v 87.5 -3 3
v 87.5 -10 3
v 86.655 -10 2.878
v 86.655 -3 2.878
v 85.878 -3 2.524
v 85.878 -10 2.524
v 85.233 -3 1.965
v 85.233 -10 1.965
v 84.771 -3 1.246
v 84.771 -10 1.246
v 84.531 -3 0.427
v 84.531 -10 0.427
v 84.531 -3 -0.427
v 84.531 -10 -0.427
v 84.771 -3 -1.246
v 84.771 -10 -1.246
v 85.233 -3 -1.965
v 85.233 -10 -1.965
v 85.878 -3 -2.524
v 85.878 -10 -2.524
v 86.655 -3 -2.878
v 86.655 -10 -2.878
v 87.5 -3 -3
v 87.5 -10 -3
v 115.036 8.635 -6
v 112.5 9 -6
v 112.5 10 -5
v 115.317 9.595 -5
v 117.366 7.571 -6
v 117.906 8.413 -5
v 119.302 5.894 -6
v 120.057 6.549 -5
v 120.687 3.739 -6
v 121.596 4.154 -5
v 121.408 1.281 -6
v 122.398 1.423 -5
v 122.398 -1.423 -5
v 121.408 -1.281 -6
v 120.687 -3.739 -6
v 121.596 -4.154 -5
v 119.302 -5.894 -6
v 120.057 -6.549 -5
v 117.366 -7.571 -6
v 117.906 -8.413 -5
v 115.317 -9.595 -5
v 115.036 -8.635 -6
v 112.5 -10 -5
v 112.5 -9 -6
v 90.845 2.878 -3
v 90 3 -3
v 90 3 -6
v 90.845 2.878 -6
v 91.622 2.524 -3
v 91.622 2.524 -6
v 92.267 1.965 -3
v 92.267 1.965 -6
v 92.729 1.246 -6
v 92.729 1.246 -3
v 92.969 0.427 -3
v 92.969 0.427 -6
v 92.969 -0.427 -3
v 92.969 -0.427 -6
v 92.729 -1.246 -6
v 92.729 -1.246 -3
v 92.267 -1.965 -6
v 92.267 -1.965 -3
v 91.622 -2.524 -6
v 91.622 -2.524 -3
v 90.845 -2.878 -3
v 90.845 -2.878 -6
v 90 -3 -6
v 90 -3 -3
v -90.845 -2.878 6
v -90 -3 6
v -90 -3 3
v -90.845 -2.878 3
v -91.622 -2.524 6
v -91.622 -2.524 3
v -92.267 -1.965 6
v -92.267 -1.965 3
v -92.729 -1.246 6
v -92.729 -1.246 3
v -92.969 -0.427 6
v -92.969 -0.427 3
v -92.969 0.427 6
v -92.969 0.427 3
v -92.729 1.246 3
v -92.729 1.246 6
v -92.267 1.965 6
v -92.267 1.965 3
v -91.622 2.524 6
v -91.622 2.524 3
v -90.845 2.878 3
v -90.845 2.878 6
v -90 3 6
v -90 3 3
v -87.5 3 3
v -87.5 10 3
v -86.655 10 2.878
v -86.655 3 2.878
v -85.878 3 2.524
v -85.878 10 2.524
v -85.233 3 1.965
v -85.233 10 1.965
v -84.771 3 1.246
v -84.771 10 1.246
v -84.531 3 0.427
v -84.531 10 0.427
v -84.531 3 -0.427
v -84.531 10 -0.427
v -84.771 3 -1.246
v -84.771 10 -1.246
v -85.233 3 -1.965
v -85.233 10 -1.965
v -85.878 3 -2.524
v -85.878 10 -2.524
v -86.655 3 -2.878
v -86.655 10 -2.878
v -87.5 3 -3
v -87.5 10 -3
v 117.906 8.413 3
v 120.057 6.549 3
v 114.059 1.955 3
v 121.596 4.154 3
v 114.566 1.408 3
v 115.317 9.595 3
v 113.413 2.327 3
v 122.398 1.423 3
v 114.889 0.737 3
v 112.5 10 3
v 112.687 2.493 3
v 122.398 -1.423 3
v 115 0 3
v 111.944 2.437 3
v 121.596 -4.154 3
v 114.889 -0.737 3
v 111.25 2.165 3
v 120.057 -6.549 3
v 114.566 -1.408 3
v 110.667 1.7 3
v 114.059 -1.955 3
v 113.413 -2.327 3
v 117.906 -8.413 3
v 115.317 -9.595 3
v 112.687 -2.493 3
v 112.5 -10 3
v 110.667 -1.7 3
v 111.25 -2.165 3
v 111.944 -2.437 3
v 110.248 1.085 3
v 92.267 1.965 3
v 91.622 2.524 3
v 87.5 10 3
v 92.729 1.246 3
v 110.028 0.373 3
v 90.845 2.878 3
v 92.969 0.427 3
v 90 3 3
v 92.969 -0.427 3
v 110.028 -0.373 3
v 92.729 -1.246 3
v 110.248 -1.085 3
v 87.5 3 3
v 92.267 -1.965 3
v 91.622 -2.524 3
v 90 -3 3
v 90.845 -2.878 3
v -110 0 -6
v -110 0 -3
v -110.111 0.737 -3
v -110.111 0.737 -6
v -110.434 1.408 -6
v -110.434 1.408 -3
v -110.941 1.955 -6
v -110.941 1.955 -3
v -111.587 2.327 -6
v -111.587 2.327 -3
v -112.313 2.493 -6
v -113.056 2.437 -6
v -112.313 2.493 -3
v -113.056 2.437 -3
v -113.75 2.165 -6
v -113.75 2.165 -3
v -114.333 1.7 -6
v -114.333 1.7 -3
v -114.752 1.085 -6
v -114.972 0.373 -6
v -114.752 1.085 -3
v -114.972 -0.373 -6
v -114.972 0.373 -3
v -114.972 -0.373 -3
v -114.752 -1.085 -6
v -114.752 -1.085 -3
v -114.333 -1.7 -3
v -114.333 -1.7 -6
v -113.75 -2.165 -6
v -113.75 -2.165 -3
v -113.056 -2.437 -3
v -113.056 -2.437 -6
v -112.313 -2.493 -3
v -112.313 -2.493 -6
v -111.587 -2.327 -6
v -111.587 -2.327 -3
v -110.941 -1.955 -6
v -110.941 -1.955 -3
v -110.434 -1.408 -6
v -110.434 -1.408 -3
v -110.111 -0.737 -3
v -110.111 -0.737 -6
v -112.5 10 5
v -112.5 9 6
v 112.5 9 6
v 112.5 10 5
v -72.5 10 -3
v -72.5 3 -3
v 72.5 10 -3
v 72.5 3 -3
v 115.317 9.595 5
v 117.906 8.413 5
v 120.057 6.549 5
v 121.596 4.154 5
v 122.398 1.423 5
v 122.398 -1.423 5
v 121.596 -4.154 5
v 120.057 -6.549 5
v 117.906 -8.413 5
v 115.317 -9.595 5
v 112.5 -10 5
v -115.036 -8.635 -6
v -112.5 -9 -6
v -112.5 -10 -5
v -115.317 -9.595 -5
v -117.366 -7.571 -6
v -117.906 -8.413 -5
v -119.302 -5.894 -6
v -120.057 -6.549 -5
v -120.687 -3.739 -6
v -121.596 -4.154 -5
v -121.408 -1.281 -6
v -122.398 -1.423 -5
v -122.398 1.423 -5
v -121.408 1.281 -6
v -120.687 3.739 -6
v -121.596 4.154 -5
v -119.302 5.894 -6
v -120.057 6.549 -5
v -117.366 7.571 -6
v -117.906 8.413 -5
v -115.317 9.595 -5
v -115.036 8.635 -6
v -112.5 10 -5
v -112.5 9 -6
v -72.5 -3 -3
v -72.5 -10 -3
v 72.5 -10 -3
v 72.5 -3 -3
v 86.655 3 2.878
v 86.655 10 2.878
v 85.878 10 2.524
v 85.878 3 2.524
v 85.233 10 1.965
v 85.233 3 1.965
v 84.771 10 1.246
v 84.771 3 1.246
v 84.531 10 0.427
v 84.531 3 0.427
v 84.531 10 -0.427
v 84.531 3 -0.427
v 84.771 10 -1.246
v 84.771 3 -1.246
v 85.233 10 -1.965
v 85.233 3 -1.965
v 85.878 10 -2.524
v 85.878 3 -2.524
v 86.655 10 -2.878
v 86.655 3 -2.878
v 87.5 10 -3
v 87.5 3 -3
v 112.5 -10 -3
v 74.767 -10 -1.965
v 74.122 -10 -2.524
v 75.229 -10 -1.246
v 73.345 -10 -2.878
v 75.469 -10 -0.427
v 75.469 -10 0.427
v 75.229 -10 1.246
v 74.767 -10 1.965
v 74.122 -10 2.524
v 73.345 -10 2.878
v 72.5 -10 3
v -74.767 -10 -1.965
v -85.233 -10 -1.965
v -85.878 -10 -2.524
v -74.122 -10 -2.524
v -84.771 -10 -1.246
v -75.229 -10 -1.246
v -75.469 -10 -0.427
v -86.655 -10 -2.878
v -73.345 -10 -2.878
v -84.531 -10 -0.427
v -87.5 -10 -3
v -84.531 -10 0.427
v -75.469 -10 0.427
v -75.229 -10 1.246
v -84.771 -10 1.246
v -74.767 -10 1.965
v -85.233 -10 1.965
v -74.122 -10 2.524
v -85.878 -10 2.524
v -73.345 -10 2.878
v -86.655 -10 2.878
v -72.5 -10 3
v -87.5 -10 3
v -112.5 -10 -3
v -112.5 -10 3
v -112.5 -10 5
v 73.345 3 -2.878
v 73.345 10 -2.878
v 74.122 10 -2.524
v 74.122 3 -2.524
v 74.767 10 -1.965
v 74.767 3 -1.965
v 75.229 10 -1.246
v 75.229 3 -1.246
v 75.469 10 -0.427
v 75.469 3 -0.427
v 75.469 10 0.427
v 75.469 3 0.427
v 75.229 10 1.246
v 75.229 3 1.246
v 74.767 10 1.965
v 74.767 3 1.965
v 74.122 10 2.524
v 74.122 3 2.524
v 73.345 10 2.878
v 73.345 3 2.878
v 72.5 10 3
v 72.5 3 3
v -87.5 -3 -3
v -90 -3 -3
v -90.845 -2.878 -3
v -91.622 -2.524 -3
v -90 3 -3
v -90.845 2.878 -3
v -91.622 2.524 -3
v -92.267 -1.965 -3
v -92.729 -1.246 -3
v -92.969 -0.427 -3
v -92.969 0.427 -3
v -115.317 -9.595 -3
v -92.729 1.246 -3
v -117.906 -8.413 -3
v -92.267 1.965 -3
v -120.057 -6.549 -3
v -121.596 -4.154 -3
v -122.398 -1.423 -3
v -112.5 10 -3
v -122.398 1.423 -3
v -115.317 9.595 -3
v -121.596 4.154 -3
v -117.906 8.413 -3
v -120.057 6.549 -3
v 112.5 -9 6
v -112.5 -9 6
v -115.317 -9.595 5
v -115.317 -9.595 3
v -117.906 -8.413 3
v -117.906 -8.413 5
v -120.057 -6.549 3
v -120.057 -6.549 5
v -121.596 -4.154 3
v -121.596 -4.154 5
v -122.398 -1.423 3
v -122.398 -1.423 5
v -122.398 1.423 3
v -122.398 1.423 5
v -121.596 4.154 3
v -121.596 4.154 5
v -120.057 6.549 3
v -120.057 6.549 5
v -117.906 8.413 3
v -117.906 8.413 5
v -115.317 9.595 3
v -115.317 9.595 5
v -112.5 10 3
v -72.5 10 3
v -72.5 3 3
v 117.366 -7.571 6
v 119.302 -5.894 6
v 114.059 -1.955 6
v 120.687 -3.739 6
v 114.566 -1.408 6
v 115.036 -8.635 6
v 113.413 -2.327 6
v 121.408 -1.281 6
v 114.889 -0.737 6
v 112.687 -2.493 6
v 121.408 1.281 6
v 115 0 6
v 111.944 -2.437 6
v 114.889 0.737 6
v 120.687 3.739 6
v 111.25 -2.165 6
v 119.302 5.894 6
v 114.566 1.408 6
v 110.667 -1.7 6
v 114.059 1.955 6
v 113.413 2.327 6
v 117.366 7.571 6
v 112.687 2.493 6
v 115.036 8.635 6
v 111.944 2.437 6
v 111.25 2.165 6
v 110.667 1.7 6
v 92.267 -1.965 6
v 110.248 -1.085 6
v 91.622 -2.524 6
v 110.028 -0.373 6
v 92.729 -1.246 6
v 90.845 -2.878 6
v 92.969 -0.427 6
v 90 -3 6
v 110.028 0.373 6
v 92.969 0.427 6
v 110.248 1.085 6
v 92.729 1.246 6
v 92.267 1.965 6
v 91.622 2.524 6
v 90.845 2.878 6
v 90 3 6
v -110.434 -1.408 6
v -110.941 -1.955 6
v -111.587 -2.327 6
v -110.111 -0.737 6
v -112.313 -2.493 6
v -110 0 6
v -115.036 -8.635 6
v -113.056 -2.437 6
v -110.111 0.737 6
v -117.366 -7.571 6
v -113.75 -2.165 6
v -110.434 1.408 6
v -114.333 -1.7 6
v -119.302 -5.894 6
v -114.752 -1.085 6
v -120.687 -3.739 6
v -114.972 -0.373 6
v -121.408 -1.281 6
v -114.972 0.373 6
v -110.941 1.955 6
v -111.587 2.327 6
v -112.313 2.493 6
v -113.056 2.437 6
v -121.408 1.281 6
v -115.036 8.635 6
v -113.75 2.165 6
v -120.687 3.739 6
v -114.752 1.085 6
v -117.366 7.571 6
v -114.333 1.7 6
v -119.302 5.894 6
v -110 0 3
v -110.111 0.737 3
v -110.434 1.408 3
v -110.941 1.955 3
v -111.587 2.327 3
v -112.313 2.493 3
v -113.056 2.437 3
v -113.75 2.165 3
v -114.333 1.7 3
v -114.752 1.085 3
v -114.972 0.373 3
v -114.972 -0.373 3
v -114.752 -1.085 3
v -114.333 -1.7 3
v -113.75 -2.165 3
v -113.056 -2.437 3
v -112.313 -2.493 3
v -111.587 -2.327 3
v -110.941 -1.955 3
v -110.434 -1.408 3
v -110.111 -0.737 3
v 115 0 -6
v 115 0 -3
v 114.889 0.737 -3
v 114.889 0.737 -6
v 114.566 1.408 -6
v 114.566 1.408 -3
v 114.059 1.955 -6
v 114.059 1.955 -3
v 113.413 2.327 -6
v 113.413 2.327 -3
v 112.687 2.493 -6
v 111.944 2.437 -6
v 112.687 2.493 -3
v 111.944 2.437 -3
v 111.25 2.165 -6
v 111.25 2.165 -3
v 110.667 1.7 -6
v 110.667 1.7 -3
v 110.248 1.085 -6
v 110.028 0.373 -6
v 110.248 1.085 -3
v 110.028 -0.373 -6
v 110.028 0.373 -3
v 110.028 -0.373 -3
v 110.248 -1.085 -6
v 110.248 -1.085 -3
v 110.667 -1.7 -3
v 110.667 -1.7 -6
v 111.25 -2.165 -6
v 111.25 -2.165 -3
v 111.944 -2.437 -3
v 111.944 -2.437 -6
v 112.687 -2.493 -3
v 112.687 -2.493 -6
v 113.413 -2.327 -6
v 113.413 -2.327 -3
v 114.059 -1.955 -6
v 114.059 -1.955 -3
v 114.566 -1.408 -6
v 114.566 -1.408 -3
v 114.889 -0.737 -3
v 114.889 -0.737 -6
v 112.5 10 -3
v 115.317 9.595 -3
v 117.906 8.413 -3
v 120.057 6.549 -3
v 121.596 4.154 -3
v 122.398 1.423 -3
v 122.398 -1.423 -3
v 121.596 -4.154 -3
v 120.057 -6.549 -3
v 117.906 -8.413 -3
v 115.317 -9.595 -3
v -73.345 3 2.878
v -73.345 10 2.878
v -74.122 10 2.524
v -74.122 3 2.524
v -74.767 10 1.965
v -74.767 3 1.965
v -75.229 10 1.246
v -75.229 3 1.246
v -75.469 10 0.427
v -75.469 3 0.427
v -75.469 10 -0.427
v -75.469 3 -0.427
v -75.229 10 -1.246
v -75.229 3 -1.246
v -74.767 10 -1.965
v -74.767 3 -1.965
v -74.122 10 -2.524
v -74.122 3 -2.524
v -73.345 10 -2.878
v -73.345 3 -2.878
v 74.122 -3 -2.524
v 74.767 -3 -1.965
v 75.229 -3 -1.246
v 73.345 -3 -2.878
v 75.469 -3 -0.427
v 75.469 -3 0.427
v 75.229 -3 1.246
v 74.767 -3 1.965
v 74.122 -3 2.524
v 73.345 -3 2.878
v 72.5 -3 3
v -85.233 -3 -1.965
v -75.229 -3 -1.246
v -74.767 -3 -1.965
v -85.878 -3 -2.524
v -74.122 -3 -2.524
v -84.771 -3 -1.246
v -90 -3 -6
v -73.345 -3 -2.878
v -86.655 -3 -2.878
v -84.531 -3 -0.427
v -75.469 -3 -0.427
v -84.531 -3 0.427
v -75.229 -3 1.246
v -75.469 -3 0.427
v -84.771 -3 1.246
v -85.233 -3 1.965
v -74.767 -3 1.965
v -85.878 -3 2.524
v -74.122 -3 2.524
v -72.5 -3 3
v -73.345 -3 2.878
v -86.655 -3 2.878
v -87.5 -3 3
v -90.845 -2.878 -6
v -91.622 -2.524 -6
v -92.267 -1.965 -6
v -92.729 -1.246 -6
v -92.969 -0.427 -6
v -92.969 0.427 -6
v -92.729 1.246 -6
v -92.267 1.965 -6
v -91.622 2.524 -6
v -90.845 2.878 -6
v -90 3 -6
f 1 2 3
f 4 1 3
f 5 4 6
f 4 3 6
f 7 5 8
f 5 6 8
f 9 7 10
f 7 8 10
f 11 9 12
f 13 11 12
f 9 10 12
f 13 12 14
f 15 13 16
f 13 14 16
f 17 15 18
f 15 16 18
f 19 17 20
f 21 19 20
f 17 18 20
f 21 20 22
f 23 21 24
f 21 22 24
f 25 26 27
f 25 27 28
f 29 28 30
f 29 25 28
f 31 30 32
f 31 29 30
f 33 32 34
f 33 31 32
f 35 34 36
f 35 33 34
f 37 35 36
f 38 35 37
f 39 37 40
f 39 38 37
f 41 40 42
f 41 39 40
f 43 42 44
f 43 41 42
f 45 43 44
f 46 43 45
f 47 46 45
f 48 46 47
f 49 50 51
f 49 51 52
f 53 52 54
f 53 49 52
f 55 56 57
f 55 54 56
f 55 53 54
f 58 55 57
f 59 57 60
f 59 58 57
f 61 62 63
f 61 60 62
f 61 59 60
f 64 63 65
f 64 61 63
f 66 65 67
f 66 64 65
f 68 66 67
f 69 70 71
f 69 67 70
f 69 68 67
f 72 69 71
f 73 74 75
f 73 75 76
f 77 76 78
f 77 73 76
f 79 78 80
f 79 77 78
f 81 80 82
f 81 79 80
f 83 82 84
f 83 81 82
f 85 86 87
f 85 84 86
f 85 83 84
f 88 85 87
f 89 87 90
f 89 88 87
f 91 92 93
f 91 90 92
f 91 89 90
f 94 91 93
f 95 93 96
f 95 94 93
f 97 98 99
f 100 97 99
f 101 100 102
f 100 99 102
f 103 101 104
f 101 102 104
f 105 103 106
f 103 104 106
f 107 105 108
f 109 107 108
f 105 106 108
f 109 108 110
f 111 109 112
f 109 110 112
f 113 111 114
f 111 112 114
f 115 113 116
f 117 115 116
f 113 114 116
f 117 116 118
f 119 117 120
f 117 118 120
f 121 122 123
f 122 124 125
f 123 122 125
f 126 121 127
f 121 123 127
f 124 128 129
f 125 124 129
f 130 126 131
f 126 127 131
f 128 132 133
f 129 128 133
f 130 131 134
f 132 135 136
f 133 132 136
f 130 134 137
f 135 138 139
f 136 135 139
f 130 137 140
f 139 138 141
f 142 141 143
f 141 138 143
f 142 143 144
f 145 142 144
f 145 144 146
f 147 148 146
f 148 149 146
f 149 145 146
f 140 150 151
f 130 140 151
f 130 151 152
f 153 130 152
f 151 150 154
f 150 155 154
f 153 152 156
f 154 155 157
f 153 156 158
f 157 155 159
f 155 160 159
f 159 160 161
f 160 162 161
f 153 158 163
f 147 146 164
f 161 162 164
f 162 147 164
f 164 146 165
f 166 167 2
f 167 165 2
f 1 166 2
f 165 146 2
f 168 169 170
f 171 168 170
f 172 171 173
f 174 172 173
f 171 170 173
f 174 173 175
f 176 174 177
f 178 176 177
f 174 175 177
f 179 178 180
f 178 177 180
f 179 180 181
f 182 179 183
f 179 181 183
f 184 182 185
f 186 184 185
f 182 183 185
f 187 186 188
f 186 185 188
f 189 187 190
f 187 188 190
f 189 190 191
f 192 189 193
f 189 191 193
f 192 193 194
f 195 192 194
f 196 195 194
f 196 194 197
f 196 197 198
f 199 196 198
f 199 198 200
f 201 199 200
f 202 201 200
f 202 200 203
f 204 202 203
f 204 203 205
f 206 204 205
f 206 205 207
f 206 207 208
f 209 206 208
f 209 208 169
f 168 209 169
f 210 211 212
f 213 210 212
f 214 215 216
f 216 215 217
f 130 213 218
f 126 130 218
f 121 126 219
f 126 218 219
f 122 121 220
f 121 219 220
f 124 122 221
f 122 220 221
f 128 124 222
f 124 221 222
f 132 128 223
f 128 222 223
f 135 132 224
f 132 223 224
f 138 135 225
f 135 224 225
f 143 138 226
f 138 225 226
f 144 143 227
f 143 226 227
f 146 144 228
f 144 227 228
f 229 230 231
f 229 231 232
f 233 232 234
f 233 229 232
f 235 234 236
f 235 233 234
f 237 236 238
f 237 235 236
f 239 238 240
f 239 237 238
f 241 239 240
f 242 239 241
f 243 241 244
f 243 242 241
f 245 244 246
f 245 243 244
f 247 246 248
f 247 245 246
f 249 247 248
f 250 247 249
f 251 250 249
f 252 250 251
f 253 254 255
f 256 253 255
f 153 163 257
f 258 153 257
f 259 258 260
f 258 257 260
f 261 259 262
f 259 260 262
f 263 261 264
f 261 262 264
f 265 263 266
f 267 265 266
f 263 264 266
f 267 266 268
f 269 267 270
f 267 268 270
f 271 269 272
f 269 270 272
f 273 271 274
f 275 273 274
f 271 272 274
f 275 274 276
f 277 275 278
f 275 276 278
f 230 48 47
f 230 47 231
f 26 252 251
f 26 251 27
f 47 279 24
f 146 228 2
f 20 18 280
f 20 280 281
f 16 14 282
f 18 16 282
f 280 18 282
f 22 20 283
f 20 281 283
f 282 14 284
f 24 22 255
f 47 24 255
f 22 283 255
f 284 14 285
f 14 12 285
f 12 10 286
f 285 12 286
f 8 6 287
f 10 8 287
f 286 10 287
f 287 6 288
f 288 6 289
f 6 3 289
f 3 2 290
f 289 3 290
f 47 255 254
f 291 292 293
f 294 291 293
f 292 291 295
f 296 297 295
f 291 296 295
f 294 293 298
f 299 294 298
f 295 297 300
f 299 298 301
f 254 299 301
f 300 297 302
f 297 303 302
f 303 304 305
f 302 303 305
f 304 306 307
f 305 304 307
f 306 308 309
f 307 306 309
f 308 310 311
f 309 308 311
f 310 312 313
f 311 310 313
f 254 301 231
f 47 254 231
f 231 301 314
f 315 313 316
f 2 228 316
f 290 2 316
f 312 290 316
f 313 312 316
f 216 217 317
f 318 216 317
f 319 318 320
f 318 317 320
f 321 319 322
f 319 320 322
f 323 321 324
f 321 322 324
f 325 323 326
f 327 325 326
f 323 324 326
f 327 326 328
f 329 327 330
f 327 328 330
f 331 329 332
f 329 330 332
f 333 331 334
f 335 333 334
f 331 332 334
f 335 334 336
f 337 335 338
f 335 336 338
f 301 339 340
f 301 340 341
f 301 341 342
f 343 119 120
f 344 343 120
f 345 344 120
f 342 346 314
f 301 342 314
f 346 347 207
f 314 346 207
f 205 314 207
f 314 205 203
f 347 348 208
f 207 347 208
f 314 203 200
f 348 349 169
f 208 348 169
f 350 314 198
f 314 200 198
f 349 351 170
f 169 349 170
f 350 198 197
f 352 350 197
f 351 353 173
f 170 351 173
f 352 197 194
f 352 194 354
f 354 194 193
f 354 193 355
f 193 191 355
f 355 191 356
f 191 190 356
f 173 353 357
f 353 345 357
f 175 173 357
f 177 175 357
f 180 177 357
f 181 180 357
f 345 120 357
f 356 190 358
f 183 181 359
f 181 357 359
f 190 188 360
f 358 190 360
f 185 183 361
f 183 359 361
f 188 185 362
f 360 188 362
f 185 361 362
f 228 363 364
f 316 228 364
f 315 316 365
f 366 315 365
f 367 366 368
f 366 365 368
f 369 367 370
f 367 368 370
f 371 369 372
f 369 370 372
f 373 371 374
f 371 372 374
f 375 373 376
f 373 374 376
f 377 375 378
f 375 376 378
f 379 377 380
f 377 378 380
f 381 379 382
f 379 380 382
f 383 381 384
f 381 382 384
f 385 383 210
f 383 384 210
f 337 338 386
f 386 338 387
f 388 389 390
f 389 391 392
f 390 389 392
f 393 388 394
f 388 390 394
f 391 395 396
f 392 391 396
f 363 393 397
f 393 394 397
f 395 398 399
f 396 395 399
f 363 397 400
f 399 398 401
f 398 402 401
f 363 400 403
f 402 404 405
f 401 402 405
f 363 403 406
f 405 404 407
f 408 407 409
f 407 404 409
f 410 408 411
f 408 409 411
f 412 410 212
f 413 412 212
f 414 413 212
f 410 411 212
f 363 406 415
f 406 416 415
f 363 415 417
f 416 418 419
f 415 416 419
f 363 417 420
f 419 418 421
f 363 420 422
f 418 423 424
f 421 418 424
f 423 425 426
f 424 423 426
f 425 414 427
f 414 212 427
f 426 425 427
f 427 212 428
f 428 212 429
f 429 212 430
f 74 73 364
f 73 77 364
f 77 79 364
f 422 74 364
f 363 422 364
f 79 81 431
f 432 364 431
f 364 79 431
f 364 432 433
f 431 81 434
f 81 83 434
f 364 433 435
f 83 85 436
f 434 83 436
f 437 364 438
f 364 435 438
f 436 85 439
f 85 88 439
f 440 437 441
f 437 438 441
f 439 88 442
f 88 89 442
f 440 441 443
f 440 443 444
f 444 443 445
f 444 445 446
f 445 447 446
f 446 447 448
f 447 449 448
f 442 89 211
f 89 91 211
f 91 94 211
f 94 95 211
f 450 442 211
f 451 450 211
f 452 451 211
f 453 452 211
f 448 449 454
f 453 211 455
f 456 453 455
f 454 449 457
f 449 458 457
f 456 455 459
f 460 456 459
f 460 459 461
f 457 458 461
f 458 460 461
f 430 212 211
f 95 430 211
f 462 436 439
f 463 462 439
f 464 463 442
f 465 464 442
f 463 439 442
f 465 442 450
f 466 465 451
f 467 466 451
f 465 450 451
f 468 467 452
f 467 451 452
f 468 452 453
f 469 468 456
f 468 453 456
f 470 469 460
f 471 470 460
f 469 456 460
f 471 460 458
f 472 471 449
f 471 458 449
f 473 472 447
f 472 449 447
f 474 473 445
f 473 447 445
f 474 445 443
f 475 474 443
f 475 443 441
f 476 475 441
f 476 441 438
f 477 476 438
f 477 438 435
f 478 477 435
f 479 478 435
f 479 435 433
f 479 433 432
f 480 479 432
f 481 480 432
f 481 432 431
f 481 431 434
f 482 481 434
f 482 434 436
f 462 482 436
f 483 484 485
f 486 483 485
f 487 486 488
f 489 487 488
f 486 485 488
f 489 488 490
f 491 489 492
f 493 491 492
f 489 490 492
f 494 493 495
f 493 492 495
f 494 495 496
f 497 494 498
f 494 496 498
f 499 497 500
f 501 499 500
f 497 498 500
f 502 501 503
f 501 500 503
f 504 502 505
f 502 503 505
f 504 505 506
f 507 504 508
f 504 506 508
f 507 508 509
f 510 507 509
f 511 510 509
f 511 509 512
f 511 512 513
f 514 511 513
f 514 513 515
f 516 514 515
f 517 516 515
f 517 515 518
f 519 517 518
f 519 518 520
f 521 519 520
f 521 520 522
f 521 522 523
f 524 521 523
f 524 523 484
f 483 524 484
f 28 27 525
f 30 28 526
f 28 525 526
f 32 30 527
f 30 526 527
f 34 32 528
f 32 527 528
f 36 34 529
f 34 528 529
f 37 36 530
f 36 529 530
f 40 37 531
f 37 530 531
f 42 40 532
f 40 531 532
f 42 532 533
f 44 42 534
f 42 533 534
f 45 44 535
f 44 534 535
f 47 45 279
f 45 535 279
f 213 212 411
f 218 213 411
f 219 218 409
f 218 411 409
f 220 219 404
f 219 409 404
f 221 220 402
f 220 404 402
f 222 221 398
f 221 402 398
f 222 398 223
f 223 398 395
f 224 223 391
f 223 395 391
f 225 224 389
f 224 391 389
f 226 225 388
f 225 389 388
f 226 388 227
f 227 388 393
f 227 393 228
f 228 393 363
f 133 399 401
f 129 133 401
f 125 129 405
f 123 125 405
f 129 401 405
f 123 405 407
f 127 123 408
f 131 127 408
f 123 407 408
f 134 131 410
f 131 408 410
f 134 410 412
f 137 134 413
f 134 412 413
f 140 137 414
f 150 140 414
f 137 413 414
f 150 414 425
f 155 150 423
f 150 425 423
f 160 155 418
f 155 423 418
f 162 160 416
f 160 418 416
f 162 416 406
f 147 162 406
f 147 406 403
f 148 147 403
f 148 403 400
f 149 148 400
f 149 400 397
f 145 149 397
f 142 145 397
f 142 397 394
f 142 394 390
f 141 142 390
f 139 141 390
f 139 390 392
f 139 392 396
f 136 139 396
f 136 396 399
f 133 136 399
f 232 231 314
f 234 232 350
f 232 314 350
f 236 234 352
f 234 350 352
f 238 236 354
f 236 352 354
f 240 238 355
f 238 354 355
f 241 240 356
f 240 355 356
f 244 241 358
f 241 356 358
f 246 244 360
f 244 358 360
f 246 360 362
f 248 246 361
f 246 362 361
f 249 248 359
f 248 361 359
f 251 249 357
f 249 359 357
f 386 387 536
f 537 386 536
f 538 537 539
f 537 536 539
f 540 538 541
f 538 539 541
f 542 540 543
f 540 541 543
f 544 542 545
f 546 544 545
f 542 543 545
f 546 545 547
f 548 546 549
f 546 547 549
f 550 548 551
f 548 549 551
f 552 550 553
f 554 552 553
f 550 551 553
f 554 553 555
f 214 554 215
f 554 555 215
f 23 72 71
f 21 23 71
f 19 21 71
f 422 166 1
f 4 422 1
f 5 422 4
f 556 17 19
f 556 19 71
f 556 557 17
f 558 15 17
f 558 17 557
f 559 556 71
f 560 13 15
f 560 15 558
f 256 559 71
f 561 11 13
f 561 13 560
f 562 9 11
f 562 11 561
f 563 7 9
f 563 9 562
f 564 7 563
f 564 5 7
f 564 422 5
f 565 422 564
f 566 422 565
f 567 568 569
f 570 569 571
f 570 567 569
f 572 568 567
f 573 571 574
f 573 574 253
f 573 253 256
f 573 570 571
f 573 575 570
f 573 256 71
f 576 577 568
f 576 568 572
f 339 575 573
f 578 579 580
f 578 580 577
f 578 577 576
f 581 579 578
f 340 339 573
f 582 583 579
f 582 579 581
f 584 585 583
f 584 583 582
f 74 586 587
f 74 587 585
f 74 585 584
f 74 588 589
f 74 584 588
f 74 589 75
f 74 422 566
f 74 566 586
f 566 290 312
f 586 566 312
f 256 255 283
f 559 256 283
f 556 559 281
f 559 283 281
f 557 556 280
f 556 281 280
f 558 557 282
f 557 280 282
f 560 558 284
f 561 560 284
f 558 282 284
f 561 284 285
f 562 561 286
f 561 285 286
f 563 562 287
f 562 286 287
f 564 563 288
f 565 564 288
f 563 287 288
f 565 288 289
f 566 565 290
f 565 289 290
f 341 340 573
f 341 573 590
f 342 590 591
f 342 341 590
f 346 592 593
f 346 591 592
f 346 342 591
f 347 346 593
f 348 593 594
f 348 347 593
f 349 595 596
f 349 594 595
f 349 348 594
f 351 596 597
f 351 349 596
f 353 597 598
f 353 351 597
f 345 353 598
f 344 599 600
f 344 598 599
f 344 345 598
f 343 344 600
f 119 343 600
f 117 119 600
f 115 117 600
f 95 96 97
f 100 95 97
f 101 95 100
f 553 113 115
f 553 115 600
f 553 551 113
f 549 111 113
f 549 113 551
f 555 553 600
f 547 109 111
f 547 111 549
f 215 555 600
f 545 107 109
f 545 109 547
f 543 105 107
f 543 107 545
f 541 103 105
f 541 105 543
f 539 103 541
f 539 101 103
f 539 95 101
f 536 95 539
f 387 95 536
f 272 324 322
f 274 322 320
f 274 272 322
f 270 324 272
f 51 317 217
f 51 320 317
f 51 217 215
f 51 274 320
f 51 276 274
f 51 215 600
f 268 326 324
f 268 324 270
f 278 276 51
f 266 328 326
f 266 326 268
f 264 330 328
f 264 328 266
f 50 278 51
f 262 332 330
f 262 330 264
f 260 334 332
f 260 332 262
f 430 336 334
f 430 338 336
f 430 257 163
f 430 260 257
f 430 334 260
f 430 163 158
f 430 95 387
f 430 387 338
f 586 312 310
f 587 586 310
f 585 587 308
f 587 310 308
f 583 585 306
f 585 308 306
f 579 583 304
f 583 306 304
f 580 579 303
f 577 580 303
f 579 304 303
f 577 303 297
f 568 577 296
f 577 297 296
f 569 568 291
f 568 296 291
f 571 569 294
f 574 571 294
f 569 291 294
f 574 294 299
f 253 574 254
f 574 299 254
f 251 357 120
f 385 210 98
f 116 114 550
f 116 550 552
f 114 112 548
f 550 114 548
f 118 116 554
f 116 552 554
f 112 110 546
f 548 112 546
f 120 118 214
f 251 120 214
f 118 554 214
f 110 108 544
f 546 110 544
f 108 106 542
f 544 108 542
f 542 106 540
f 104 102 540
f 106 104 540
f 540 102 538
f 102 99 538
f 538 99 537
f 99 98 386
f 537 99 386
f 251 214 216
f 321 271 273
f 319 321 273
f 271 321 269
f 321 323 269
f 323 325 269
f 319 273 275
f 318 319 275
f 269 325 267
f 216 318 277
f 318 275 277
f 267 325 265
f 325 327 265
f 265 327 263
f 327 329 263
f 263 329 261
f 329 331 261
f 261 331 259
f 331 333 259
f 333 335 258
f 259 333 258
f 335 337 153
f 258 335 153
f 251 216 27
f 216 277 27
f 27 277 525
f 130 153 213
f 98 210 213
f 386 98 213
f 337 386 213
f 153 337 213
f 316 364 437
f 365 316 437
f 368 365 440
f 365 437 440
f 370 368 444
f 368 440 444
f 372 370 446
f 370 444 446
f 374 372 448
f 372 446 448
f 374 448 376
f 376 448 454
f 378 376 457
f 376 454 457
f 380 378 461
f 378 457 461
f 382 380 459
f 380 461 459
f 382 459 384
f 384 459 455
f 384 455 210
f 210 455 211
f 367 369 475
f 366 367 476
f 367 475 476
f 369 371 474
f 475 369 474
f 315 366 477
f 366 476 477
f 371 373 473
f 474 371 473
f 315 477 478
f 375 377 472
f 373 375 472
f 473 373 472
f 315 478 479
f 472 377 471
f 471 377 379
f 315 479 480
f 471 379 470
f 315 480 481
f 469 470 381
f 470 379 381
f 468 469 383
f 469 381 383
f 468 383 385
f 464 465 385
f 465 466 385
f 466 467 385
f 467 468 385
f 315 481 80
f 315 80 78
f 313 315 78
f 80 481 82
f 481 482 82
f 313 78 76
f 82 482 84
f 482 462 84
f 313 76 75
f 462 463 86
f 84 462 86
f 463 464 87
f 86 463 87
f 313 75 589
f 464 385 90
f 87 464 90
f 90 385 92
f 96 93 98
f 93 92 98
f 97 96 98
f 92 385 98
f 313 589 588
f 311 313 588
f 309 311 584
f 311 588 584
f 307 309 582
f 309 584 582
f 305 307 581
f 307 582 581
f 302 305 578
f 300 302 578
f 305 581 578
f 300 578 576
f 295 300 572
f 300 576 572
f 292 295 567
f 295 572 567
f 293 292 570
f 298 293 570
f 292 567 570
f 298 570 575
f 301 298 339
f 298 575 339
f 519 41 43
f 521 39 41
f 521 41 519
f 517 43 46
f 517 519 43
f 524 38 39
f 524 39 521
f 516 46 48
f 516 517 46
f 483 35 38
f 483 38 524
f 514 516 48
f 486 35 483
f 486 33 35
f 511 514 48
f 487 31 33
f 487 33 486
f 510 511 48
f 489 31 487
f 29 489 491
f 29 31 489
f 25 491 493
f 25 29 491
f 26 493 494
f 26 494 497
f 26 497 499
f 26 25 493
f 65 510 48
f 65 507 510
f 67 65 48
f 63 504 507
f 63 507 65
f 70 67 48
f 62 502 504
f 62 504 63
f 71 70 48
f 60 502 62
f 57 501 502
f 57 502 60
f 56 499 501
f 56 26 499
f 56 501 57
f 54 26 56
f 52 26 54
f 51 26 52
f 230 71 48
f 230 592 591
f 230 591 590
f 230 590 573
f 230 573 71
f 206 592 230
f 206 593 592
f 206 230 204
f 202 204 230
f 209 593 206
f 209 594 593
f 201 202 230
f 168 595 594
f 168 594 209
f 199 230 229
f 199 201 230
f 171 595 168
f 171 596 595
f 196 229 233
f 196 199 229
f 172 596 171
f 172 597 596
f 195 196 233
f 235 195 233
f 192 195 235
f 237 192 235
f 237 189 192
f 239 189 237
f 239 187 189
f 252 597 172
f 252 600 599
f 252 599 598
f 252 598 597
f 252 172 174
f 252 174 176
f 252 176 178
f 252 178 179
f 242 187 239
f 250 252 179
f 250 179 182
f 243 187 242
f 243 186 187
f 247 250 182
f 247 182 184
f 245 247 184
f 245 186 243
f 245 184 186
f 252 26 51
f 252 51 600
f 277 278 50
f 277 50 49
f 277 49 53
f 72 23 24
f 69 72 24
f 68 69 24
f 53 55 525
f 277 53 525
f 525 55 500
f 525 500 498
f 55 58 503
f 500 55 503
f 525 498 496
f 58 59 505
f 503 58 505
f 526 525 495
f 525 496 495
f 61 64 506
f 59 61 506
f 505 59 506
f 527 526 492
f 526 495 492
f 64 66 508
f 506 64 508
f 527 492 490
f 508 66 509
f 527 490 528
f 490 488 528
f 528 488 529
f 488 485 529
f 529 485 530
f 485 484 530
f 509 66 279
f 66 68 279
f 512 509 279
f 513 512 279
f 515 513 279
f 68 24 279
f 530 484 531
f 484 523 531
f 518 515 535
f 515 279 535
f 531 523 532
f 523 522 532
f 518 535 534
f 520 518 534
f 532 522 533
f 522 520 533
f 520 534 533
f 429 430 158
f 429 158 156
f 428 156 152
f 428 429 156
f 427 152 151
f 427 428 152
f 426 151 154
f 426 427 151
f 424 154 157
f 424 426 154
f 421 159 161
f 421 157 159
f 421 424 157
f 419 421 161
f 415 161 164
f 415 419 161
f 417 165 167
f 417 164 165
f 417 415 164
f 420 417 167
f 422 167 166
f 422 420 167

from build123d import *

# Parameters (mm, degrees)
BOSS_EXTRUDE1_DEPTH = 6
CUT_EXTRUDE1_DEPTH  = 51
SKETCH4_R           = 2.5
CUT_EXTRUDE2_DEPTH  = 102
CHAMFER1_SIZE       = 1


with BuildPart() as part:
    # Sketch2 → Boss-Extrude1 (new, symmetric)
    with BuildSketch(Plane.XY):
        with BuildLine():
            Line((-112.5, 10), (112.5, 10))
            ThreePointArc((112.5, 10), (122.5, 0), (112.5, -10))
            Line((112.5, -10), (-112.5, -10))
            ThreePointArc((-112.5, -10), (-122.5, 0), (-112.5, 10))
        make_face()
    extrude(amount=BOSS_EXTRUDE1_DEPTH, both=True)

    # Sketch3 → Cut-Extrude1 (cut, symmetric)
    with BuildSketch(Plane(origin=(0, 0, 0), x_dir=(1, 0, 0), z_dir=(0, 1, 0))):
        with BuildLine():
            Line((-72.5, 3), (72.5, 3))
            ThreePointArc((72.5, 3), (75.5, 0), (72.5, -3))
            Line((72.5, -3), (-72.5, -3))
            ThreePointArc((-72.5, -3), (-75.5, 0), (-72.5, 3))
        make_face()
        with BuildLine():
            Line((157.5, -3), (87.5, -3))
            ThreePointArc((87.5, -3), (84.5, 0), (87.5, 3))
            Line((87.5, 3), (157.5, 3))
            ThreePointArc((157.5, 3), (160.5, 0), (157.5, -3))
        make_face()
        with BuildLine():
            Line((-157.5, -3), (-87.5, -3))
            ThreePointArc((-87.5, -3), (-84.5, 0), (-87.5, 3))
            Line((-87.5, 3), (-157.5, 3))
            ThreePointArc((-157.5, 3), (-160.5, 0), (-157.5, -3))
        make_face()
    extrude(amount=CUT_EXTRUDE1_DEPTH, both=True, mode=Mode.SUBTRACT)

    # Sketch4 → Cut-Extrude2 (cut)
    with BuildSketch(Plane.XY.offset(6)):
        with Locations((112.5, 0)):
            Circle(SKETCH4_R)
        with Locations((-112.5, 0)):
            Circle(SKETCH4_R)
        with BuildLine():
            Line((-90, 3), (90, 3))
            ThreePointArc((90, 3), (93, 0), (90, -3))
            Line((90, -3), (-90, -3))
            ThreePointArc((-90, -3), (-93, 0), (-90, 3))
        make_face()
    extrude(amount=-CUT_EXTRUDE2_DEPTH, mode=Mode.SUBTRACT)

    # Chamfer1
    chamfer1_edges = [part.edges().sort_by_distance(p)[0] for p in [
        (122.5, 0, -6),
        (0, 10, -6),
        (-122.5, 0, -6),
        (0, 10, 6),
        (122.5, 0, 6),
        (0, -10, 6),
        (-122.5, 0, 6),
        (0, -10, -6),
    ]]
    chamfer(chamfer1_edges, length=CHAMFER1_SIZE)


solid = part.part
